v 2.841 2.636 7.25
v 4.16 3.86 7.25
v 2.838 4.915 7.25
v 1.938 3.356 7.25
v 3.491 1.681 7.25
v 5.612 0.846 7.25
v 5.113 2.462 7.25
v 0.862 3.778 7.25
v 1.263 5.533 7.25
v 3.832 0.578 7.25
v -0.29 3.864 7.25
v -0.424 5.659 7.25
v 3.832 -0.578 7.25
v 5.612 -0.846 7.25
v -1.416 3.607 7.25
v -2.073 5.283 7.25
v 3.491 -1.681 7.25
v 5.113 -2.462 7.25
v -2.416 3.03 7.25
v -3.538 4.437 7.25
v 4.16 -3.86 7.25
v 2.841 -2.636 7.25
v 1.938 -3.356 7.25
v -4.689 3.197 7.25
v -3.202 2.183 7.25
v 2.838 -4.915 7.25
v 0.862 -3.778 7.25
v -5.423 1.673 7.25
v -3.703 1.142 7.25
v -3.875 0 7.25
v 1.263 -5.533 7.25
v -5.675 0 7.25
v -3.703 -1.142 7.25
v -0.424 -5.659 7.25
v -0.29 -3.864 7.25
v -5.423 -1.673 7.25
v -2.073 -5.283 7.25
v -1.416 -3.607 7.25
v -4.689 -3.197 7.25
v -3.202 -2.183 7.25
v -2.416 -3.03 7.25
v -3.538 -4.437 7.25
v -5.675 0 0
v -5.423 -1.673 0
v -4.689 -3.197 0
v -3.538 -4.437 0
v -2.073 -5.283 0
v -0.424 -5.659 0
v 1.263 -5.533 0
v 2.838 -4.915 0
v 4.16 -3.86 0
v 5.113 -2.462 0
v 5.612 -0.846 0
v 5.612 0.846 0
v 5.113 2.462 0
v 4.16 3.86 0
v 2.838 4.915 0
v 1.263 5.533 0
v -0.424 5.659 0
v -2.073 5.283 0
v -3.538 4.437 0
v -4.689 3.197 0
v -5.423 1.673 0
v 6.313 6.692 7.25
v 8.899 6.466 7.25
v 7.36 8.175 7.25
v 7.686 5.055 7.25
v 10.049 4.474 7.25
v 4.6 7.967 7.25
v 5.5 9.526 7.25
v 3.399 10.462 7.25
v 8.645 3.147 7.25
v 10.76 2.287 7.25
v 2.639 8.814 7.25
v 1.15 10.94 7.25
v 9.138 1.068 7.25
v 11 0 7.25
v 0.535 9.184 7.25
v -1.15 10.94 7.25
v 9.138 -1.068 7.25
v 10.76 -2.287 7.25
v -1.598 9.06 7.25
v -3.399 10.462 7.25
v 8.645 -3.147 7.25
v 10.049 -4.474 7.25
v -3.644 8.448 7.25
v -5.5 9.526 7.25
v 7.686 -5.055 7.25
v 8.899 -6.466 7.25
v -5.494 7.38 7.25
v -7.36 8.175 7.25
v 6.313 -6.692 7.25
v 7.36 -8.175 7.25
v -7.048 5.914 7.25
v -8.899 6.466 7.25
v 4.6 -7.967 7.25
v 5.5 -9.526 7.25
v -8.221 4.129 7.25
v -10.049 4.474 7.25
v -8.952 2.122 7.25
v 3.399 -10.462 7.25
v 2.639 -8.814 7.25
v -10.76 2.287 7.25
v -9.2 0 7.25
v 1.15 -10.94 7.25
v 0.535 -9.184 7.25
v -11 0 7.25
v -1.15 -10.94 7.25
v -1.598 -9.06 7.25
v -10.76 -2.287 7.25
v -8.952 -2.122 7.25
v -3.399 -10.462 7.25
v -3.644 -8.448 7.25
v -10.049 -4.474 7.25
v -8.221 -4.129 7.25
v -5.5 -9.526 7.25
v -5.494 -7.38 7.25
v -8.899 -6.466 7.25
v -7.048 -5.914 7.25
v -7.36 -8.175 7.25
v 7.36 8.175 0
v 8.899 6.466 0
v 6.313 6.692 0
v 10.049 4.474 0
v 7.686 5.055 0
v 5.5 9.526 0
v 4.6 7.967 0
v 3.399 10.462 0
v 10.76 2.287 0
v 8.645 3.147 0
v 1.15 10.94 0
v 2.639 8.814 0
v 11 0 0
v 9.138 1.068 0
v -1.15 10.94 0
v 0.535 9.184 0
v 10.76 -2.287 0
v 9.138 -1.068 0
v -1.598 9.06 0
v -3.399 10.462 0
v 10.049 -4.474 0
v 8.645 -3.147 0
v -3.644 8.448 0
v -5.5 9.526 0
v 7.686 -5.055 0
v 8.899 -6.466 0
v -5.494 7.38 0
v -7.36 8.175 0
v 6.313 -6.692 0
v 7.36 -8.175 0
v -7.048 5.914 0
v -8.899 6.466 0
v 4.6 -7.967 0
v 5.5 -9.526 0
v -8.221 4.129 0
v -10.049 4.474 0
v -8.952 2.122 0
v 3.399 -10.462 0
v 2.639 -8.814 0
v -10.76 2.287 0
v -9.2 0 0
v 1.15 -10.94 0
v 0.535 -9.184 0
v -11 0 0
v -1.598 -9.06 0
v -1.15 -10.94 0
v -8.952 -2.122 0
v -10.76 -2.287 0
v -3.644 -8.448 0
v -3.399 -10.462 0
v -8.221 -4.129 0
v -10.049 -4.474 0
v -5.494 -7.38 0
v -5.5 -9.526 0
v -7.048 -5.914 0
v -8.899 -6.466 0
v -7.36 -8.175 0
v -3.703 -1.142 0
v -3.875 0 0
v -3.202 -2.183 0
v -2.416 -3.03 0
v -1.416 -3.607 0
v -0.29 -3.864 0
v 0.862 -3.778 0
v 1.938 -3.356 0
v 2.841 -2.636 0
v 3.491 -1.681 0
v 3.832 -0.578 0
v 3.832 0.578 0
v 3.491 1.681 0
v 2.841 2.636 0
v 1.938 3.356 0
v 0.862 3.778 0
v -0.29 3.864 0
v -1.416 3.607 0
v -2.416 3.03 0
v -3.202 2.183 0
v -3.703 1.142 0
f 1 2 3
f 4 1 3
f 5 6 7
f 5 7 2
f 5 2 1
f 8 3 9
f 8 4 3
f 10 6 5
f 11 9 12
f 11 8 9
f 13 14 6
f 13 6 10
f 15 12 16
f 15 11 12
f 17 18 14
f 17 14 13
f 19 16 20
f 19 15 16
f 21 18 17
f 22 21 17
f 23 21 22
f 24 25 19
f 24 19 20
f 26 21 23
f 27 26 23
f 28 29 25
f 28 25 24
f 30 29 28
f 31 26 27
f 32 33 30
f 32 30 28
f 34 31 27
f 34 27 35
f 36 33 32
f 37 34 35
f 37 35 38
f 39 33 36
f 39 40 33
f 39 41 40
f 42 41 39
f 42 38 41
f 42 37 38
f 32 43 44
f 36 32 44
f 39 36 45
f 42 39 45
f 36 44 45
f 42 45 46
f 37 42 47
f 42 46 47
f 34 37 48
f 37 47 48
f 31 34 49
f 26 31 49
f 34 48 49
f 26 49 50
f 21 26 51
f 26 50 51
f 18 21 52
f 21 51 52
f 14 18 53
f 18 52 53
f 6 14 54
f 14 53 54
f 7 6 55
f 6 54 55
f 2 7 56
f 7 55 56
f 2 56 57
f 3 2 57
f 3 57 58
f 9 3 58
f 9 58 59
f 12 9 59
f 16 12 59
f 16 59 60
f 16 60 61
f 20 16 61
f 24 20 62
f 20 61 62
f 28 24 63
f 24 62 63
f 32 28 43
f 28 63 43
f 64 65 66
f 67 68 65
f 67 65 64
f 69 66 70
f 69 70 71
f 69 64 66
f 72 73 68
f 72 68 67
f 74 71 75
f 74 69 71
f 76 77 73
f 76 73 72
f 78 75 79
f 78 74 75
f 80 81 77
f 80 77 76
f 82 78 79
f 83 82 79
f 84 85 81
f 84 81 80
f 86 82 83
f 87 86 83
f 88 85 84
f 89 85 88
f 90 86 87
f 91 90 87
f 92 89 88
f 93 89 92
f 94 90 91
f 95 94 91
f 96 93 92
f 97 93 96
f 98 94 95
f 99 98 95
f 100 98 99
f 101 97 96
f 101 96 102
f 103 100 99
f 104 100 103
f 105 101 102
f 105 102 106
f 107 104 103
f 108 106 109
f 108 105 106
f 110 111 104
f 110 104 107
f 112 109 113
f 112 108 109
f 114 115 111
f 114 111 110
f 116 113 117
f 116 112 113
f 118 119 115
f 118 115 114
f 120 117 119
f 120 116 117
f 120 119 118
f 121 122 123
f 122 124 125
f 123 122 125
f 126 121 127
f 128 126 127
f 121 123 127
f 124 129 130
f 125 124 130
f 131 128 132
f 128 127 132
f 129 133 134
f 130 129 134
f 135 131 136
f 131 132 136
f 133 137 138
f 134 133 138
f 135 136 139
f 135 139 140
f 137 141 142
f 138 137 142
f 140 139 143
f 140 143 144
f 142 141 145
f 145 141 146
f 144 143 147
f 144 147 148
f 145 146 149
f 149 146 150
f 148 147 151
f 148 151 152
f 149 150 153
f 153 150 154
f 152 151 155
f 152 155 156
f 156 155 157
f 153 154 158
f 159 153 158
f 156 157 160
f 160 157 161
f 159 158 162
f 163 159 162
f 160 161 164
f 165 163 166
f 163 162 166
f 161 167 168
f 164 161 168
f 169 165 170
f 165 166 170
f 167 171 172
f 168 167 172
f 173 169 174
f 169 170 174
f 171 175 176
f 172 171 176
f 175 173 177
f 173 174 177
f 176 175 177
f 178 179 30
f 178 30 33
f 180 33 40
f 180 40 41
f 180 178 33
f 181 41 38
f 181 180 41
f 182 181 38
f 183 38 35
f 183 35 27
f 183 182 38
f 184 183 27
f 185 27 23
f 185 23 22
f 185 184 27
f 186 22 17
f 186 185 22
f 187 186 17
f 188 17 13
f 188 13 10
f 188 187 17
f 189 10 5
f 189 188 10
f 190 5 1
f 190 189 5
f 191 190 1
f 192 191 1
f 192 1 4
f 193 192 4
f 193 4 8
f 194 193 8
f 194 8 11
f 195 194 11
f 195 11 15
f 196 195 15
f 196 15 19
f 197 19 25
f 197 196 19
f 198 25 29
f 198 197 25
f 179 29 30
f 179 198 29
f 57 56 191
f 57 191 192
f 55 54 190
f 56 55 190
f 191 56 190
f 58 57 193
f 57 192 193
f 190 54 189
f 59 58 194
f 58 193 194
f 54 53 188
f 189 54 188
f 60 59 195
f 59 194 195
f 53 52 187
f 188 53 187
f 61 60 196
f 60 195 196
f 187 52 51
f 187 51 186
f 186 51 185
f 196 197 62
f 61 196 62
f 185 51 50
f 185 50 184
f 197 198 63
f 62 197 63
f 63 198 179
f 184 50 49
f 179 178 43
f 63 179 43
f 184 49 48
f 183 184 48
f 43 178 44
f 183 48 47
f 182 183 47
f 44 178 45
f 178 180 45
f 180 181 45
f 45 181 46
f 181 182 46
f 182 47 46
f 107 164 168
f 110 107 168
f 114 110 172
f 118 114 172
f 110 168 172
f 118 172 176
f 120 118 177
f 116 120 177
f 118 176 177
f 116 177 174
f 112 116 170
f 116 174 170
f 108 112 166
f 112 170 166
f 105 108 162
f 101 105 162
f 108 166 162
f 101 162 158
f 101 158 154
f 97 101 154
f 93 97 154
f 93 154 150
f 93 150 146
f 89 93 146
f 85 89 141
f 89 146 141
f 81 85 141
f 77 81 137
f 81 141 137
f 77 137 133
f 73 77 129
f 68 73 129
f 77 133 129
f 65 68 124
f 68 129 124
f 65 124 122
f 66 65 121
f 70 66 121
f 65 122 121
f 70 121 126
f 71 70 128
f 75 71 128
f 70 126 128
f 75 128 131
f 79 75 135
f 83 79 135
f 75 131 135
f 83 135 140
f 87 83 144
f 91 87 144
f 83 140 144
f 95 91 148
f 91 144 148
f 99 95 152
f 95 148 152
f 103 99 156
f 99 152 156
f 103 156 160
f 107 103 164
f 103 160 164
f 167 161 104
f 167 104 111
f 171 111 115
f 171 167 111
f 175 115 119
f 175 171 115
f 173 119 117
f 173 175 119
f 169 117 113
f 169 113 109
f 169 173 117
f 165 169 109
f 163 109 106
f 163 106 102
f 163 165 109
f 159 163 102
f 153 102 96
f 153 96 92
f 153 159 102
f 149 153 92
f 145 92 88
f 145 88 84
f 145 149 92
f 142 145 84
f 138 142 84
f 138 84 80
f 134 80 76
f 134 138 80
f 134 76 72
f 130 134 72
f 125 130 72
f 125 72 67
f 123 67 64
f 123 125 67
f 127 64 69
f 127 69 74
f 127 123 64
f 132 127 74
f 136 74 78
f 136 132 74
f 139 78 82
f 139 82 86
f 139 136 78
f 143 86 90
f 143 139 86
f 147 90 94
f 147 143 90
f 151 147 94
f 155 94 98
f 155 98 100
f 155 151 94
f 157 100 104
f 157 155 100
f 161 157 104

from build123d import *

# Parameters (mm, degrees)
SKETCH_1_R        = 11
SKETCH_1_R_2      = 9.2
EXTRUDE_1_DEPTH   = 7.25
SKETCH_1_R_3      = 5.675
SKETCH_1_R_4      = 3.875
EXTRUDE_1_2_DEPTH = 7.25


with BuildPart() as part:
    # 스케치1 → 보스-돌출1 (new body)
    with BuildSketch(Plane.XY):
        with Locations(Location((0, 0, 0), (0, 0, 180))):
            Circle(SKETCH_1_R)
        with Locations(Location((0, 0, 0), (0, 0, 180))):
            Circle(SKETCH_1_R_2, mode=Mode.SUBTRACT)
    extrude(amount=EXTRUDE_1_DEPTH)


with BuildPart() as body_2:
    # 스케치1 → Extrude 1 2 (new body)
    with BuildSketch(Plane.XY):
        with Locations(Location((0, 0, 0), (0, 0, 180))):
            Circle(SKETCH_1_R_3)
        with Locations(Location((0, 0, 0), (0, 0, 180))):
            Circle(SKETCH_1_R_4, mode=Mode.SUBTRACT)
    extrude(amount=EXTRUDE_1_2_DEPTH)


solid = Compound([part.part, body_2.part])
